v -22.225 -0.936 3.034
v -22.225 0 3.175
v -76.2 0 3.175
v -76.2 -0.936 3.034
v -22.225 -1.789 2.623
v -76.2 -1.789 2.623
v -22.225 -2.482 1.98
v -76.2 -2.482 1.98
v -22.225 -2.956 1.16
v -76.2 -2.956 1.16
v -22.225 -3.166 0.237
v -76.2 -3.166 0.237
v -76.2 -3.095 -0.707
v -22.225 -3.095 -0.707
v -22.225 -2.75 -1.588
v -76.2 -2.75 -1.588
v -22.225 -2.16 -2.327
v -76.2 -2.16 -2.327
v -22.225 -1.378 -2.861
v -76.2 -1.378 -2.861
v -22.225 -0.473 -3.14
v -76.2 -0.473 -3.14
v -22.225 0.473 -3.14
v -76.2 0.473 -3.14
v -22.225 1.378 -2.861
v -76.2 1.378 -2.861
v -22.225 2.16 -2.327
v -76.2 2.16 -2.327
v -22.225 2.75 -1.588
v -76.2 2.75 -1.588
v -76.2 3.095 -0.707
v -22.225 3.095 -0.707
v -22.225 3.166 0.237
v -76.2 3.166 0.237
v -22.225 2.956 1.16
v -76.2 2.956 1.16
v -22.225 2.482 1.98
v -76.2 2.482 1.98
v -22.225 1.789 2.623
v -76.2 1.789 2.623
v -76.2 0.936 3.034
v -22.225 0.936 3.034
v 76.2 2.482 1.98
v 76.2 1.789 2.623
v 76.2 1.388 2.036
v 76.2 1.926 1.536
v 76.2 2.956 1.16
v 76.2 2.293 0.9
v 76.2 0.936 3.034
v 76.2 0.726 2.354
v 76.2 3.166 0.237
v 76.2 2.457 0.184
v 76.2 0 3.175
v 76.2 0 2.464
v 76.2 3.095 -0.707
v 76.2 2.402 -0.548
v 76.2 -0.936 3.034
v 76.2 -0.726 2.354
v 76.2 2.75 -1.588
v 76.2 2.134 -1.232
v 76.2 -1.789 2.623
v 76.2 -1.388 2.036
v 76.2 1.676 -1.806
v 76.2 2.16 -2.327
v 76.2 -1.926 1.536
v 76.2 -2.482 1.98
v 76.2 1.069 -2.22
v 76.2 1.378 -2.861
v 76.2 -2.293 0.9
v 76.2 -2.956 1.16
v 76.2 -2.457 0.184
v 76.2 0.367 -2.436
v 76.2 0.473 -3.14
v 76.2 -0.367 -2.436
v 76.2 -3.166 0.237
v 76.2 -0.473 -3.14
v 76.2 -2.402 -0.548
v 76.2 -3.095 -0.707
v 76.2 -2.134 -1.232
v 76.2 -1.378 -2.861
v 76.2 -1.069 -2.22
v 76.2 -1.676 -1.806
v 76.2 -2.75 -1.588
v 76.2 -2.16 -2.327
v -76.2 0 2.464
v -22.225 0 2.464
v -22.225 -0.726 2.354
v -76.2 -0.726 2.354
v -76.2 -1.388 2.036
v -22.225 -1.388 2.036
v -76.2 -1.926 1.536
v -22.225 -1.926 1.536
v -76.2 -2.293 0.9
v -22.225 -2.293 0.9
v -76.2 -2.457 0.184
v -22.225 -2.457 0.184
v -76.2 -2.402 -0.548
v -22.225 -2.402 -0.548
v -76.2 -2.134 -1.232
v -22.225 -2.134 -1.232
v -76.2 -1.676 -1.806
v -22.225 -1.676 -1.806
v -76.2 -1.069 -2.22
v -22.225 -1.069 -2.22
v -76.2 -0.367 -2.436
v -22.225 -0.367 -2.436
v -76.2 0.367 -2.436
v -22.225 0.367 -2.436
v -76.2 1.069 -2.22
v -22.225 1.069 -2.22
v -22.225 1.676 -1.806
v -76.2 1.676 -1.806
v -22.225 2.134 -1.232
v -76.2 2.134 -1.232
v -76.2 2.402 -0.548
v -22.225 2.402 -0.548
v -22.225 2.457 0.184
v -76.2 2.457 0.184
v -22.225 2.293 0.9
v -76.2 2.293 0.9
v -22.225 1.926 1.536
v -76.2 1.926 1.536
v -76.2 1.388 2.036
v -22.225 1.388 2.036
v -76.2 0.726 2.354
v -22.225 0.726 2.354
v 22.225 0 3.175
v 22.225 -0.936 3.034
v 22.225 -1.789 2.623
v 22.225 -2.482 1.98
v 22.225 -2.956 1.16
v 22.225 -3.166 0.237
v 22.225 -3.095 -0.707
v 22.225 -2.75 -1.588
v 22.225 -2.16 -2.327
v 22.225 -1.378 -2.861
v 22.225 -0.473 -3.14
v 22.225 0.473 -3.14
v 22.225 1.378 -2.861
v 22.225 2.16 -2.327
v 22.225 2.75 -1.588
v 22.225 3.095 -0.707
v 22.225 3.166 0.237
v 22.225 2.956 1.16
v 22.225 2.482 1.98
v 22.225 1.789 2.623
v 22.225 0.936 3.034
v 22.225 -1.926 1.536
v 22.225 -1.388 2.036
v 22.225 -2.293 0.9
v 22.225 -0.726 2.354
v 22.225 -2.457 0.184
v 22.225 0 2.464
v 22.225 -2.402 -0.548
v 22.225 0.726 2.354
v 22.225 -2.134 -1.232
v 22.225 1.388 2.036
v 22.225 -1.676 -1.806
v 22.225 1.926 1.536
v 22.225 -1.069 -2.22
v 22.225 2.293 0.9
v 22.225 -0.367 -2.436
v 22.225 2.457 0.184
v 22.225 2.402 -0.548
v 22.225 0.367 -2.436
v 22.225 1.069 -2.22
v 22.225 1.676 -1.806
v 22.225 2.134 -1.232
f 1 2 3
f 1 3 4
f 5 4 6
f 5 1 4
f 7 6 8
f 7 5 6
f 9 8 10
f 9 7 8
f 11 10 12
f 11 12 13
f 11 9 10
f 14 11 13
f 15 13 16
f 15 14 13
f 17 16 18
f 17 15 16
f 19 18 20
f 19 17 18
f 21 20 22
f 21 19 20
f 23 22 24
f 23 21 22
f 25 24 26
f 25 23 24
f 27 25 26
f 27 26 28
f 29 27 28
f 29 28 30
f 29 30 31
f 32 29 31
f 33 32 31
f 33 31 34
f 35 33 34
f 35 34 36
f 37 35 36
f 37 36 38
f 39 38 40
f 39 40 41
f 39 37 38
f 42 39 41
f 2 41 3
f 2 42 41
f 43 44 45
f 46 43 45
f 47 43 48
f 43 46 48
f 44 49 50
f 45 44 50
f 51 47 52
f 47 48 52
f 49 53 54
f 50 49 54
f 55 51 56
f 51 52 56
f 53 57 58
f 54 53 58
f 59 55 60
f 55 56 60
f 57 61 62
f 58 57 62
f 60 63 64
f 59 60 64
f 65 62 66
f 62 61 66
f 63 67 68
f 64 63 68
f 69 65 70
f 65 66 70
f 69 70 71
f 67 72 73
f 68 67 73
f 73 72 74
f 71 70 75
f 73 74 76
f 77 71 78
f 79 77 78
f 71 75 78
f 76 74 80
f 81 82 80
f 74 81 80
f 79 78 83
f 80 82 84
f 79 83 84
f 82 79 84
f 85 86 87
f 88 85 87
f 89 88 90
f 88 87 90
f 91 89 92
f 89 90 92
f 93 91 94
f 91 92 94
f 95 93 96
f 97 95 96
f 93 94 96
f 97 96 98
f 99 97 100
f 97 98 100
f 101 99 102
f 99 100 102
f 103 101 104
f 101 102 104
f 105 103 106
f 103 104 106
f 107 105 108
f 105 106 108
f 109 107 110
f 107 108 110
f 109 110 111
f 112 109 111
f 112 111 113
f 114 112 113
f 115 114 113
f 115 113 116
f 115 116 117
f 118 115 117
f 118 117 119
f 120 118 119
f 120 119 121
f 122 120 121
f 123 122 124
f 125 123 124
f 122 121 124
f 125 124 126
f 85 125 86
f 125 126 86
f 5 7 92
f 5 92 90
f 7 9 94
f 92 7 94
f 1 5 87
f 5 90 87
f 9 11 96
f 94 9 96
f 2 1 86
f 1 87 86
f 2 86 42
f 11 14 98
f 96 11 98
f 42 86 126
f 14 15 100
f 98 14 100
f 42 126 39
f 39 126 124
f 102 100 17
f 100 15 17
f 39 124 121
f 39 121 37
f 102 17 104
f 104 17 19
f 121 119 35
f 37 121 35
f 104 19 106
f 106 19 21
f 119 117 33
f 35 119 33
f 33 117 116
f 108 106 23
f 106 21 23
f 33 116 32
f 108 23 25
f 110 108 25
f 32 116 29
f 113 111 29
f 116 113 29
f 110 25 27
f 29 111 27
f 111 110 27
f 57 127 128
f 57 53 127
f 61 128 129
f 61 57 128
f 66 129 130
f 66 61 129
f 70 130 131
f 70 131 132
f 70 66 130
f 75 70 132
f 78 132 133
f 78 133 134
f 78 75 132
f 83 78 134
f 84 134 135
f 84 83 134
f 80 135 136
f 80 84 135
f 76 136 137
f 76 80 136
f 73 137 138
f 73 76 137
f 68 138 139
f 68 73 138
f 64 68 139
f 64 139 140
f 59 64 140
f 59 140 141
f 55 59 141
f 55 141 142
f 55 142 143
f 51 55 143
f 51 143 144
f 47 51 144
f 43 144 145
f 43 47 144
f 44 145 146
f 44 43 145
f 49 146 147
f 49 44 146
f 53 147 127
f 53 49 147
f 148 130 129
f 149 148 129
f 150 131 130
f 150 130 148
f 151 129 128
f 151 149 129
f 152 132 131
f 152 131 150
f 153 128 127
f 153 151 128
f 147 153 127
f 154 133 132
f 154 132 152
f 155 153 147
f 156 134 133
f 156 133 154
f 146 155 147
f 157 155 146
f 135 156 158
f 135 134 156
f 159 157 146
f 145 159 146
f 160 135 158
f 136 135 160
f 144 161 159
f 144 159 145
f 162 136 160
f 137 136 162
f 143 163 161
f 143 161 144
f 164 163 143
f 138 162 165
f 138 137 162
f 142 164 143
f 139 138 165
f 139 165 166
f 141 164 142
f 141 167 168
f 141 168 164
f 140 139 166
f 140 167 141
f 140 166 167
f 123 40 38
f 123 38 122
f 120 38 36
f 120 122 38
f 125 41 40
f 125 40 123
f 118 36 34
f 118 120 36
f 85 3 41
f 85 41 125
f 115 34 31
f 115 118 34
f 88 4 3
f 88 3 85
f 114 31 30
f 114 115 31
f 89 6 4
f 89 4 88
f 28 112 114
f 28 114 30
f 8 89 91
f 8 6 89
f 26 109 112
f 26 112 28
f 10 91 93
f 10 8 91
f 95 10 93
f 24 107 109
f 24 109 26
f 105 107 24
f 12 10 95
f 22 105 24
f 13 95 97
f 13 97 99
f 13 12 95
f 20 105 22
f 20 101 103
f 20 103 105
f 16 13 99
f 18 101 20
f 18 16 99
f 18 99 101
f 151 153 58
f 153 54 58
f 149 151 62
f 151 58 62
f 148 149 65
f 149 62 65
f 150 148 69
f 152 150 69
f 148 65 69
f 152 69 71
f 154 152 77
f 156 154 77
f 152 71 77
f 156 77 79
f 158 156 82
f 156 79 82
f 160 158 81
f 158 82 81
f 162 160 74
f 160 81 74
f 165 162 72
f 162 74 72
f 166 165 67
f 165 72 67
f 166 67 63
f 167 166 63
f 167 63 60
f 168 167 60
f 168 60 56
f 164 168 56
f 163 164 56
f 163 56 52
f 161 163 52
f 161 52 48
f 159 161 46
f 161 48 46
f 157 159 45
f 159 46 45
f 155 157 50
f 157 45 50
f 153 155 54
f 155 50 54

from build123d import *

# Parameters (mm, degrees)
SKETCH3_W               = 152.4
SKETCH3_H               = 0.7112
CUT_EXTRUDE1_DEPTH      = 77.332177029
CUT_EXTRUDE1_DEPTH_BACK = 77.332177029
SKETCH4_W               = 44.45
SKETCH4_H               = 44.45


with BuildPart() as part:
    # Sketch3 → Revolve1 (revolve)
    with BuildSketch(Plane.XY, mode=Mode.PRIVATE) as revolve1_sk:
        with Locations((0, 2.8194)):
            Rectangle(SKETCH3_W, SKETCH3_H)
    revolve(revolve1_sk.sketch.rotate(Axis((-76.2, 0, 0), (1, 0, 0)), 90), axis=Axis((-76.2, 0, 0), (1, 0, 0)))

    # Sketch4 → Cut-Extrude1 (cut, two sides: drawn at the far end of the back side and taken through both)
    with BuildSketch(Plane.XY.offset(-CUT_EXTRUDE1_DEPTH_BACK)):
        Rectangle(SKETCH4_W, SKETCH4_H)
    extrude(amount=CUT_EXTRUDE1_DEPTH + CUT_EXTRUDE1_DEPTH_BACK, mode=Mode.SUBTRACT)


with BuildPart() as cut_extrude1_piece_1:
    # of the separate pieces the step leaves, piece 1, a body of its own (cut_extrude1_pieces)
    add(part.part.solids().sort_by_distance((-76.2, 0, 3.175))[0])


with BuildPart() as cut_extrude1_piece_2:
    # of the separate pieces the step leaves, piece 2, a body of its own (cut_extrude1_pieces)
    add(part.part.solids().sort_by_distance((22.225, 0, 3.175))[0])


solid = Compound([cut_extrude1_piece_1.part, cut_extrude1_piece_2.part])
